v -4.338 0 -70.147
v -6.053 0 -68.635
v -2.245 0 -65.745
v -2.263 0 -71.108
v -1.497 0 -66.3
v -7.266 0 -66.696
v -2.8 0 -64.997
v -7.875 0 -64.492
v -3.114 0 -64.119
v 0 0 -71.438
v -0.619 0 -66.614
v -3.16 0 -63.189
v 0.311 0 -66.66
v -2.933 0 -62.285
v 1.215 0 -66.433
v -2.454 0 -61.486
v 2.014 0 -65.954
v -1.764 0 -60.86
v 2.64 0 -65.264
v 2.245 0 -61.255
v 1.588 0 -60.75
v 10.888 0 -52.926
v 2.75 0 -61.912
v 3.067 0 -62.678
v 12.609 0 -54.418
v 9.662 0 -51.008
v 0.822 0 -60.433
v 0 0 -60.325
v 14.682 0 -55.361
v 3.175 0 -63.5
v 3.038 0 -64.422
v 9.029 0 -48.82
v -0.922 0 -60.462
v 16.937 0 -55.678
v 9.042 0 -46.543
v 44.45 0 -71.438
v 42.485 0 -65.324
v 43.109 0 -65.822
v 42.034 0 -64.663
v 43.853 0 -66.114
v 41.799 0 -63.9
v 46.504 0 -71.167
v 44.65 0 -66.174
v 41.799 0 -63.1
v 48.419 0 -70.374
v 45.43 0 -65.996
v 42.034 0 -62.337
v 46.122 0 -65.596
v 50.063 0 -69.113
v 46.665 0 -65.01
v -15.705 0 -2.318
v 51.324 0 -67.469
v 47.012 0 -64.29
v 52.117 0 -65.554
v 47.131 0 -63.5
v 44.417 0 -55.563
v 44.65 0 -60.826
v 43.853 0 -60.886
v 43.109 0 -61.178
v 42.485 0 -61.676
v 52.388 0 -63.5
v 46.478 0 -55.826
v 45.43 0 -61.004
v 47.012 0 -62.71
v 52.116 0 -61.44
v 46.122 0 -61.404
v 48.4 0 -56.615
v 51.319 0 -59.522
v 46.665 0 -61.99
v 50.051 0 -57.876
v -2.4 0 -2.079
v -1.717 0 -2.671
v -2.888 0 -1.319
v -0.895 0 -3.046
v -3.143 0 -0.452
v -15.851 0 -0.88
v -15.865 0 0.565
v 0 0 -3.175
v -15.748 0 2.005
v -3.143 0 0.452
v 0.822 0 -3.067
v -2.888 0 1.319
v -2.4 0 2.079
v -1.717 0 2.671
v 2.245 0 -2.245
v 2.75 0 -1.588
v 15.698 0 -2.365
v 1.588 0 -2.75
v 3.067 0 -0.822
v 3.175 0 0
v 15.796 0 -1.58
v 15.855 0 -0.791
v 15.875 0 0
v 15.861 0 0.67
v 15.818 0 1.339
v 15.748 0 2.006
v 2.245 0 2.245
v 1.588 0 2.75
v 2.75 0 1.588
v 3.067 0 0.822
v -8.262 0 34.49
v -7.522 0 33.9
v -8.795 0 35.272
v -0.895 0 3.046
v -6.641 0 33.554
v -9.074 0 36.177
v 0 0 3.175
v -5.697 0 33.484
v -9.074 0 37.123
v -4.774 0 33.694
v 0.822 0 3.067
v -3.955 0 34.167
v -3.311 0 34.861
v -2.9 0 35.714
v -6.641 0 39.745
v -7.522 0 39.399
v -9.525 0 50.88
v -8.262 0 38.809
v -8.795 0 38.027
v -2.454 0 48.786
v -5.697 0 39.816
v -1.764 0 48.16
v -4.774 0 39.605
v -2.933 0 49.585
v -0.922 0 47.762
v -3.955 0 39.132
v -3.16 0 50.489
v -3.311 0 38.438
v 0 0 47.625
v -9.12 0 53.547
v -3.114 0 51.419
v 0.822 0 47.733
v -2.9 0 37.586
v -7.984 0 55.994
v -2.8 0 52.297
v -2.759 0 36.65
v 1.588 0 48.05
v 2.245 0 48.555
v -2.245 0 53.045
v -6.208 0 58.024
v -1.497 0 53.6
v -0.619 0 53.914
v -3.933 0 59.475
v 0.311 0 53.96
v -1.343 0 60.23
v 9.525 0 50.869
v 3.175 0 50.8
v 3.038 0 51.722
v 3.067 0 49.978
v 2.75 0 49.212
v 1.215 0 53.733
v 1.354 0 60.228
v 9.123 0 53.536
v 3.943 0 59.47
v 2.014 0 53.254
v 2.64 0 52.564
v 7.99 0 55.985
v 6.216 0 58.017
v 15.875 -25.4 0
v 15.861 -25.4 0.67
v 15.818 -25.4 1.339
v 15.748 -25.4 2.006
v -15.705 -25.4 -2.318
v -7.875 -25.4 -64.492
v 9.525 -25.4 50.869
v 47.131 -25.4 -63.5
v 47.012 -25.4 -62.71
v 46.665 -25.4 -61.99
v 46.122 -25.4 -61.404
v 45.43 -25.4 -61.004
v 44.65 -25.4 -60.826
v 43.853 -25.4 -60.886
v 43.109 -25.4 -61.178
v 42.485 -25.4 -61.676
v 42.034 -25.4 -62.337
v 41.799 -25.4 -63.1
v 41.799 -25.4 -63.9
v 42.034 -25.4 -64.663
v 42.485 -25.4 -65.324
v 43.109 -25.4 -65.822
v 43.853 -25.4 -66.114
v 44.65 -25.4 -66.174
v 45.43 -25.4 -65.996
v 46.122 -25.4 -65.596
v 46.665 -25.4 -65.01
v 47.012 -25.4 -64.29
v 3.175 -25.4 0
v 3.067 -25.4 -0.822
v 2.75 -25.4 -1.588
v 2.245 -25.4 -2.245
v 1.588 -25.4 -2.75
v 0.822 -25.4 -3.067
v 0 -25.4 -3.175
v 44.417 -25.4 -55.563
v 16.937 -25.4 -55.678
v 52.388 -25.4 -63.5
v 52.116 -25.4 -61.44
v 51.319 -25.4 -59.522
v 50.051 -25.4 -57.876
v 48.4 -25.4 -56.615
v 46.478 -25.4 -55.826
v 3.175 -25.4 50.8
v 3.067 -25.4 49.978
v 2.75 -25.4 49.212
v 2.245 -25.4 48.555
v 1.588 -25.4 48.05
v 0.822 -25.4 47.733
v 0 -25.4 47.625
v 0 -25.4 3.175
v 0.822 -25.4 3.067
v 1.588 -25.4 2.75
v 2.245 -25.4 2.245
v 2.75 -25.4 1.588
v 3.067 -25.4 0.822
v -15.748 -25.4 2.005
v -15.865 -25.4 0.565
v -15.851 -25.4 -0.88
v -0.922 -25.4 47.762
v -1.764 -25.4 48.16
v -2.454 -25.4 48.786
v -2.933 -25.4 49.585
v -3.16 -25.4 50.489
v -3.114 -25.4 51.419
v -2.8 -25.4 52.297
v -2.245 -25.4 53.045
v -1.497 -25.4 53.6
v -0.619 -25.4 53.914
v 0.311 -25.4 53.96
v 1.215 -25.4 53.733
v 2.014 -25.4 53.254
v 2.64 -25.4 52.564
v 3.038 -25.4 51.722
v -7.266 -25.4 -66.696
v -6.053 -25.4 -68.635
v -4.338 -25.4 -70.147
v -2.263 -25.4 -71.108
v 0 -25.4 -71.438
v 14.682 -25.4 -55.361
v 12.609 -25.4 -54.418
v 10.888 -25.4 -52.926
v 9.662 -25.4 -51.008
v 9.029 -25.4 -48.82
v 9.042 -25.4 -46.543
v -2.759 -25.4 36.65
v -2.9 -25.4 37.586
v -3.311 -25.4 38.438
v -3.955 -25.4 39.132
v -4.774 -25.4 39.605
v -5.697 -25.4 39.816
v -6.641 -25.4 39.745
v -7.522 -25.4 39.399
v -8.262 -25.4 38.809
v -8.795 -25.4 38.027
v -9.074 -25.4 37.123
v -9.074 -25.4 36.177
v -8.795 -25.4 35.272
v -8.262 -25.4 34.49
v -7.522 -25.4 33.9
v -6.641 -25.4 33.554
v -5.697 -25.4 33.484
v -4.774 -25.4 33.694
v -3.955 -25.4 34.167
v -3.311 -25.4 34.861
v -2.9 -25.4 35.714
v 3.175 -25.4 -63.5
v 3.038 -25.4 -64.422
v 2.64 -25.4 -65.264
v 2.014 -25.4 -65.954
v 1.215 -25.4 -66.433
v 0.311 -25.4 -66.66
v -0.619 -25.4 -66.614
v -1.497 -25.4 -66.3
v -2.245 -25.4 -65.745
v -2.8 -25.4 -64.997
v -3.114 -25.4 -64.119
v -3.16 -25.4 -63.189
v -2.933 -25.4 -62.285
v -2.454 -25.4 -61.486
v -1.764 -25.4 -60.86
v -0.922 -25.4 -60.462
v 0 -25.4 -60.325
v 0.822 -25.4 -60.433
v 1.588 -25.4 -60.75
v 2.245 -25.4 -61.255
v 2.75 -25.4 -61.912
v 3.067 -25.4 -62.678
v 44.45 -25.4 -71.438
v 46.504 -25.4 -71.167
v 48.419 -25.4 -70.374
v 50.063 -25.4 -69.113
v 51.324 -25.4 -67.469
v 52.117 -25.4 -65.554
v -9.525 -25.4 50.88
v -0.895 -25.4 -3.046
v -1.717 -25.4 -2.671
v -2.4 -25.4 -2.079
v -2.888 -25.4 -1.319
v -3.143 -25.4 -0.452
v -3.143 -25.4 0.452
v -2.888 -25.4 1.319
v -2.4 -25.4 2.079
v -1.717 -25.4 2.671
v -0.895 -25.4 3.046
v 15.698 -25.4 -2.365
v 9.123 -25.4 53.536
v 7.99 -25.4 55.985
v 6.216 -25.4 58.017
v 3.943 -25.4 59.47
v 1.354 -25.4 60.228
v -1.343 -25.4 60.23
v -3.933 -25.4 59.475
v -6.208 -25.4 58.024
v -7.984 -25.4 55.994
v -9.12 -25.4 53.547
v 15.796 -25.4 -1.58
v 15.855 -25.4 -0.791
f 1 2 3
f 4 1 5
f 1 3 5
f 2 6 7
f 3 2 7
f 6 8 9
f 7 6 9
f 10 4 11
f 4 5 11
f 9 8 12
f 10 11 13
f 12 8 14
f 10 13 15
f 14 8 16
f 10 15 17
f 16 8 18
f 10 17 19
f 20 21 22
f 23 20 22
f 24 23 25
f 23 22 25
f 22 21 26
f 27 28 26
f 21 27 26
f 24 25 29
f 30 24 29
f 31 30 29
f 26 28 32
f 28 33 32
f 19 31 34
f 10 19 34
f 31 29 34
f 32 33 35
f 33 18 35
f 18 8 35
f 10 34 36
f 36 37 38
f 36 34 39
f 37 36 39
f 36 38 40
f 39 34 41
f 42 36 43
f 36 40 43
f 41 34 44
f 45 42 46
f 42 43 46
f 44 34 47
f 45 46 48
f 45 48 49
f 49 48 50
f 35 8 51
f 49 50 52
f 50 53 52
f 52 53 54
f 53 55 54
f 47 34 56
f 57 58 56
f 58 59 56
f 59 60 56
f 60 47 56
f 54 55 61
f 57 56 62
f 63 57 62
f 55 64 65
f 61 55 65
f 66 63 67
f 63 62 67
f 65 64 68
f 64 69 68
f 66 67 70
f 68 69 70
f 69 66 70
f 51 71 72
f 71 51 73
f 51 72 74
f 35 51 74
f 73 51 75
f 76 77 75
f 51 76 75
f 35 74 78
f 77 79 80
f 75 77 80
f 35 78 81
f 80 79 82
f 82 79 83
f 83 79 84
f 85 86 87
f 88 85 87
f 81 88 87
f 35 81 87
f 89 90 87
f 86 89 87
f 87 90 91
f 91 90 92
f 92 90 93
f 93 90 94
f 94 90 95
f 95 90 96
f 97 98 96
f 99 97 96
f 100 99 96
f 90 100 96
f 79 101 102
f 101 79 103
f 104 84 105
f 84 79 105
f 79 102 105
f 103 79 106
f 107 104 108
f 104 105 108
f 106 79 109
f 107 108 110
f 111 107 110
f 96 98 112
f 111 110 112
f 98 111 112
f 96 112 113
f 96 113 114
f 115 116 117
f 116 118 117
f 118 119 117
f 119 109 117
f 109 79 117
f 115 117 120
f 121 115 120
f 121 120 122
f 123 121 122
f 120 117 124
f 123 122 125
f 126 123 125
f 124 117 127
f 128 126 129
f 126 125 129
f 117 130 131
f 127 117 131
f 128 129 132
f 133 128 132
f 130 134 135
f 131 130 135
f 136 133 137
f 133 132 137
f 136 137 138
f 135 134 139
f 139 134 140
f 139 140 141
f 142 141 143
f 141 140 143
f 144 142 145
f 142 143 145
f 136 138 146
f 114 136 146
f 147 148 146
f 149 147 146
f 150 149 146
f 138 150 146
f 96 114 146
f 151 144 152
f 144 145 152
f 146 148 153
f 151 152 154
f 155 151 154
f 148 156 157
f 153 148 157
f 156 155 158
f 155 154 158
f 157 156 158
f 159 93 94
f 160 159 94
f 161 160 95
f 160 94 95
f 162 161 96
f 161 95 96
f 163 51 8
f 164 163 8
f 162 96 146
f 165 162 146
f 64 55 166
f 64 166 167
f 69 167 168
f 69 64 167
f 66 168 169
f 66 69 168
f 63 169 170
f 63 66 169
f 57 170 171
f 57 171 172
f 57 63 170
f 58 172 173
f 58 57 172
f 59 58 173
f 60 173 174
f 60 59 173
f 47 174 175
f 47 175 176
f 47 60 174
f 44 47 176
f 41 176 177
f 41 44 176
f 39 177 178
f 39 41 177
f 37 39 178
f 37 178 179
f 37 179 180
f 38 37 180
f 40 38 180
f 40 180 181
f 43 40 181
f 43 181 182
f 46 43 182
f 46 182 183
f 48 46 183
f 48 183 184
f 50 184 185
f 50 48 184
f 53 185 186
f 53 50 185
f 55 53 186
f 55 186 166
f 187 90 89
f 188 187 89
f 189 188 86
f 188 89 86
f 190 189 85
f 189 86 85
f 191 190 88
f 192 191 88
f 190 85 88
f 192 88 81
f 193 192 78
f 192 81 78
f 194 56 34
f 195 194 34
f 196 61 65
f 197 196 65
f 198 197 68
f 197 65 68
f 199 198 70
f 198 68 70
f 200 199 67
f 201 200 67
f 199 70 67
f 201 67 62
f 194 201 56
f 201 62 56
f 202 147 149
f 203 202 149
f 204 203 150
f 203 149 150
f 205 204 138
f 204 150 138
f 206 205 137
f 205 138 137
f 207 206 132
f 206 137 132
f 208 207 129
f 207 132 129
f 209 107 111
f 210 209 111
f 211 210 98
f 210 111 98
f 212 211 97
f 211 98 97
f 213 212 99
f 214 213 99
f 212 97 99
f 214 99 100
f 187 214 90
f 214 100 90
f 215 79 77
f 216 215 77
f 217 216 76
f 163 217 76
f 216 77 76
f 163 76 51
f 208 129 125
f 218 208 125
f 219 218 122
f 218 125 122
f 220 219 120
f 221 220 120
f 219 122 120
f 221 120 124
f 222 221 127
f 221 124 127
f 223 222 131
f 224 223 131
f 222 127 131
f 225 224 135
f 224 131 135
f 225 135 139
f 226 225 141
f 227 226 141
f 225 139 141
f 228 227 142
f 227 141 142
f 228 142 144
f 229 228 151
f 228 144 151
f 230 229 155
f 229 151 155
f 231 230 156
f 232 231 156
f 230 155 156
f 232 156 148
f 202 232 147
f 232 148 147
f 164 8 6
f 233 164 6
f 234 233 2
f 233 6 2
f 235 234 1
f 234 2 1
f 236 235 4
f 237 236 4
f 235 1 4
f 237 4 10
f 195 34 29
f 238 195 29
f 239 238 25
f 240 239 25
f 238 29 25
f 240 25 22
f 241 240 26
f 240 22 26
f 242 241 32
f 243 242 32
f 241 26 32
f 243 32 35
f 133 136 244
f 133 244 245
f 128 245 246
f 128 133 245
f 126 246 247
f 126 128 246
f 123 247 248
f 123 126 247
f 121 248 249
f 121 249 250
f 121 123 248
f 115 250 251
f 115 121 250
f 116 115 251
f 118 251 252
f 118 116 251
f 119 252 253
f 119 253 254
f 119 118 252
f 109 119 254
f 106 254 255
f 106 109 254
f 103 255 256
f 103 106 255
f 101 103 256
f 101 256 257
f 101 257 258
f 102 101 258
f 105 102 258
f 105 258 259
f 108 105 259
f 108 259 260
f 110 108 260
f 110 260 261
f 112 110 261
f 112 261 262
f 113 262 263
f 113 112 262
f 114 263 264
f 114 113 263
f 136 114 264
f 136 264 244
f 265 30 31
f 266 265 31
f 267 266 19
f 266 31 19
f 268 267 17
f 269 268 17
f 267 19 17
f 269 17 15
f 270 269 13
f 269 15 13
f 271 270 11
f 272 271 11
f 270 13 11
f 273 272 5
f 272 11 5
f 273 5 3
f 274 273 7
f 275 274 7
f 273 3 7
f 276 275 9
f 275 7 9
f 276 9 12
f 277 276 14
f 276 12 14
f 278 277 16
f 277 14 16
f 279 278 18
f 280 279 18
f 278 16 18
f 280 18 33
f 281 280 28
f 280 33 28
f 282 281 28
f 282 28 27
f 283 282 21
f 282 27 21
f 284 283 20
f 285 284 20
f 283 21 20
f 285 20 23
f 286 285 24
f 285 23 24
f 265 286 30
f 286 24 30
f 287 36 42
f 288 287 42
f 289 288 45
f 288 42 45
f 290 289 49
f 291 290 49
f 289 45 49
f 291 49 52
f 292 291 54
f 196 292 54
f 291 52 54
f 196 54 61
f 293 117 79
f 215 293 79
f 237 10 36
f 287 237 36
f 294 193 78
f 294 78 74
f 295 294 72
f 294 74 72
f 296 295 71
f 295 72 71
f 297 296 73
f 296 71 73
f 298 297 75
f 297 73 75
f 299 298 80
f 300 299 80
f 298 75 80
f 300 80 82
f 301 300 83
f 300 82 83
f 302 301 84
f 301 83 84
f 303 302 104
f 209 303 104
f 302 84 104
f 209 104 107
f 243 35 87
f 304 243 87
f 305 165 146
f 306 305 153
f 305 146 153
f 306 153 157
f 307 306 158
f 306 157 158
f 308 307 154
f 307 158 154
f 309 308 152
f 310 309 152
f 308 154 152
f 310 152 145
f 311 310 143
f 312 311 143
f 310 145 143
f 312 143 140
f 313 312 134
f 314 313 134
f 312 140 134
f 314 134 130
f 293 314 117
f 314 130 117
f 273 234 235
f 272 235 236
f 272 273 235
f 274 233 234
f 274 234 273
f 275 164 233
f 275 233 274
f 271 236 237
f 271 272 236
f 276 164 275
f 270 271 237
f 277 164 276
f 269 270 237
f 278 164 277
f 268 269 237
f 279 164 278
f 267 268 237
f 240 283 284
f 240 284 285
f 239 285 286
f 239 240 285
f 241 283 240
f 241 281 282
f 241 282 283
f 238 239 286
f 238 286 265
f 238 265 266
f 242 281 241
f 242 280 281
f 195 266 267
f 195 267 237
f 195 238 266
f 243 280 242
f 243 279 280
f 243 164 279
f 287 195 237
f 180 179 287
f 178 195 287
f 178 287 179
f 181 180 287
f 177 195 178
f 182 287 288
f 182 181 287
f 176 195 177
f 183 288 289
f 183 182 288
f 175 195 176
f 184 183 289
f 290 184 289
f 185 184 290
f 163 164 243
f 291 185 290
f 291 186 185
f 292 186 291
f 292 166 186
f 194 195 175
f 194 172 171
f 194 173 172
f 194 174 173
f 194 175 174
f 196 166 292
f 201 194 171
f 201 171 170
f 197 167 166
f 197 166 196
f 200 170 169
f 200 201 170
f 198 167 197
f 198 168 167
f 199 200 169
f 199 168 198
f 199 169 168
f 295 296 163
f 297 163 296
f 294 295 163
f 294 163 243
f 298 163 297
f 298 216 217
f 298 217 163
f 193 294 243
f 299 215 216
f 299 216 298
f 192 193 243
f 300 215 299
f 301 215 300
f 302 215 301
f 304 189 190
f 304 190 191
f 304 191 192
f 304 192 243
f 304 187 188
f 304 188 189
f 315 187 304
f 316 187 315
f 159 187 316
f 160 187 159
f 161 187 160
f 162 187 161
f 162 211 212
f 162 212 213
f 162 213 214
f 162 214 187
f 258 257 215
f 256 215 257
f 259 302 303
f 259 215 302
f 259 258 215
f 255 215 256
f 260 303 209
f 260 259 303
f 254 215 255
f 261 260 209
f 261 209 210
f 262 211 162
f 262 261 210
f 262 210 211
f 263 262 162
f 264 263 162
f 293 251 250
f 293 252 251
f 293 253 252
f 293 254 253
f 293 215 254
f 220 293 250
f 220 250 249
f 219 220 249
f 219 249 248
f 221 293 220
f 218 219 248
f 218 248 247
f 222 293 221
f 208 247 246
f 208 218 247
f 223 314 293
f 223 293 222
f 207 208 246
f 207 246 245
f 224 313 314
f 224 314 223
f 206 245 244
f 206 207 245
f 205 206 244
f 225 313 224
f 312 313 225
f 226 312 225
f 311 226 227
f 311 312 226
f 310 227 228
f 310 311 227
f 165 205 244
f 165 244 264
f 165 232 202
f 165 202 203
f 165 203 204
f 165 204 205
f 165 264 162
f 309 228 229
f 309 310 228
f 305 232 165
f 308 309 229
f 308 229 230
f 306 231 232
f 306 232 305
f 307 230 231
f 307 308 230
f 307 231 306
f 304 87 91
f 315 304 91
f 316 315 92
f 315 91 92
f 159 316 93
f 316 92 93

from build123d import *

# Parameters (mm, degrees)
F0_R     = 3.175
F0_R_2   = 2.6811430303
F1_DEPTH = 25.4
F2_DEPTH = 25.4
F3_DEPTH = 25.4


with BuildPart() as f1:
    # F0 (on Front) → F1 (new body)
    with BuildSketch(Plane.XZ):
        with BuildLine():
            ThreePointArc((-9.5246666481, 50.8796884045), (-6.7633075138, 44.0930411904), (0, 41.275))
            ThreePointArc((0, 41.275), (6.7351920908, 44.0648079092), (9.525, 50.8))
            ThreePointArc((9.525, 50.8), (9.5249382463, 50.8342987513), (9.524752986, 50.8685970579))
            ThreePointArc((9.524752986, 50.8685970579), (0.0055458414, 60.3249983855), (-9.5246666481, 50.8796884045))
        make_face()
        with BuildLine():
            ThreePointArc((3.175, 50.8), (2.2450640303, 48.5549359697), (0, 47.625))
            ThreePointArc((0, 47.625), (-2.2450640303, 53.0450640303), (3.175, 50.8))
        make_face(mode=Mode.SUBTRACT)
        with BuildLine():
            ThreePointArc((9.525, 50.8), (6.7351920908, 44.0648079092), (0, 41.275))
            Line((0, 41.275), (0, 36.5252))
            Line((0, 36.5252), (0, 15.875))
            ThreePointArc((0, 15.875), (10.4923027044, 11.9133206521), (15.7478005035, 2.0055932546))
            Line((15.7478005035, 2.0055932546), (9.524752986, 50.8685970579))
            ThreePointArc((9.524752986, 50.8685970579), (9.5249382463, 50.8342987513), (9.525, 50.8))
        make_face()
        with BuildLine():
            Line((0, 36.5252), (0, 41.275))
            ThreePointArc((0, 41.275), (-6.7633075138, 44.0930411904), (-9.5246666481, 50.8796884045))
            Line((-9.5246666481, 50.8796884045), (-15.747854052, 2.0051727503))
            ThreePointArc((-15.747854052, 2.0051727503), (-10.4924617605, 11.9131805663), (0, 15.875))
            Line((0, 15.875), (0, 36.5252))
        make_face()
        with Locations((-5.9342440218, 36.6497449577)):
            Circle(F0_R, mode=Mode.SUBTRACT)
        with BuildLine():
            ThreePointArc((15.7478005035, 2.0055932546), (10.4923027044, 11.9133206521), (0, 15.875))
            Line((0, 15.875), (0, 3.175))
            ThreePointArc((0, 3.175), (2.2450640303, 2.2450640303), (3.175, 0))
            ThreePointArc((3.175, 0), (2.2450640303, -2.2450640303), (0, -3.175))
            Line((0, -3.175), (0, -15.875))
            ThreePointArc((0, -15.875), (10.3554540779, -12.0324642464), (15.697843269, -2.3650246727))
            ThreePointArc((15.697843269, -2.3650246727), (15.8306488638, -1.1858252622), (15.875, 0))
            ThreePointArc((15.875, 0), (15.8431682121, 1.004811427), (15.7478005035, 2.0055932546))
        make_face()
        with BuildLine():
            Line((0, 3.175), (0, 15.875))
            ThreePointArc((0, 15.875), (-10.4924617605, 11.9131805663), (-15.747854052, 2.0051727503))
            ThreePointArc((-15.747854052, 2.0051727503), (-15.8742138864, -0.1579825563), (-15.7048272525, -2.3181945497))
            ThreePointArc((-15.7048272525, -2.3181945497), (-10.3733862968, -12.0170080194), (0, -15.875))
            Line((0, -15.875), (0, -3.175))
            ThreePointArc((0, -3.175), (-3.175, 0), (0, 3.175))
        make_face()
        with BuildLine():
            ThreePointArc((0, -15.875), (-10.3733862968, -12.0170080194), (-15.7048272525, -2.3181945497))
            Line((-15.7048272525, -2.3181945497), (-7.8753007349, -64.4917381631))
            ThreePointArc((-7.8753007349, -64.4917381631), (-5.9529752192, -58.2496674115), (0, -55.5625))
            Line((0, -55.5625), (0, -15.875))
        make_face()
        with BuildLine():
            ThreePointArc((15.697843269, -2.3650246727), (10.3554540779, -12.0324642464), (0, -15.875))
            Line((0, -15.875), (0, -55.5625))
            ThreePointArc((0, -55.5625), (5.6126600757, -57.8873399243), (7.9375, -63.5))
            ThreePointArc((7.9375, -63.5), (5.6126600757, -69.1126600757), (0, -71.4375))
            Line((0, -71.4375), (44.45, -71.4375))
            ThreePointArc((44.45, -71.4375), (36.5125174611, -63.5166491853), (44.4167017026, -55.5625698445))
            Line((44.4167017026, -55.5625698445), (16.9368082183, -55.6778506909))
            ThreePointArc((16.9368082183, -55.6778506909), (10.8884896462, -52.9263600902), (9.0419767345, -46.543316291))
            Line((9.0419767345, -46.543316291), (15.697843269, -2.3650246727))
        make_face()
        with BuildLine():
            ThreePointArc((0, -55.5625), (-5.9529752192, -58.2496674115), (-7.8753007349, -64.4917381631))
            ThreePointArc((-7.8753007349, -64.4917381631), (-5.2503325885, -69.4529752192), (0, -71.4375))
            ThreePointArc((0, -71.4375), (5.6126600757, -69.1126600757), (7.9375, -63.5))
            ThreePointArc((7.9375, -63.5), (5.6126600757, -57.8873399243), (0, -55.5625))
        make_face()
        with BuildLine():
            ThreePointArc((3.175, -63.5), (-2.2450640303, -65.7450640303), (0, -60.325))
            ThreePointArc((0, -60.325), (2.2450640303, -61.2549359697), (3.175, -63.5))
        make_face(mode=Mode.SUBTRACT)
        with BuildLine():
            ThreePointArc((44.4167017026, -55.5625698445), (36.5125174611, -63.5166491853), (44.45, -71.4375))
            ThreePointArc((44.45, -71.4375), (50.0626600757, -69.1126600757), (52.3875, -63.5))
            ThreePointArc((52.3875, -63.5), (50.0508749769, -57.8755795194), (44.4167017026, -55.5625698445))
        make_face()
        with Locations((44.45, -63.5)):
            Circle(F0_R_2, mode=Mode.SUBTRACT)
    extrude(amount=F1_DEPTH)

    # F0 (on Front) → F2 (join)
    with BuildSketch(Plane.XZ):
        with BuildLine():
            ThreePointArc((-9.5246666481, 50.8796884045), (-6.7633075138, 44.0930411904), (0, 41.275))
            ThreePointArc((0, 41.275), (6.7351920908, 44.0648079092), (9.525, 50.8))
            ThreePointArc((9.525, 50.8), (9.5249382463, 50.8342987513), (9.524752986, 50.8685970579))
            ThreePointArc((9.524752986, 50.8685970579), (0.0055458414, 60.3249983855), (-9.5246666481, 50.8796884045))
        make_face()
        with BuildLine():
            ThreePointArc((3.175, 50.8), (2.2450640303, 48.5549359697), (0, 47.625))
            ThreePointArc((0, 47.625), (-2.2450640303, 53.0450640303), (3.175, 50.8))
        make_face(mode=Mode.SUBTRACT)
        with BuildLine():
            ThreePointArc((9.525, 50.8), (6.7351920908, 44.0648079092), (0, 41.275))
            Line((0, 41.275), (0, 36.5252))
            Line((0, 36.5252), (0, 15.875))
            ThreePointArc((0, 15.875), (10.4923027044, 11.9133206521), (15.7478005035, 2.0055932546))
            Line((15.7478005035, 2.0055932546), (9.524752986, 50.8685970579))
            ThreePointArc((9.524752986, 50.8685970579), (9.5249382463, 50.8342987513), (9.525, 50.8))
        make_face()
        with BuildLine():
            Line((0, 36.5252), (0, 41.275))
            ThreePointArc((0, 41.275), (-6.7633075138, 44.0930411904), (-9.5246666481, 50.8796884045))
            Line((-9.5246666481, 50.8796884045), (-15.747854052, 2.0051727503))
            ThreePointArc((-15.747854052, 2.0051727503), (-10.4924617605, 11.9131805663), (0, 15.875))
            Line((0, 15.875), (0, 36.5252))
        make_face()
        with Locations((-5.9342440218, 36.6497449577)):
            Circle(F0_R, mode=Mode.SUBTRACT)
        with BuildLine():
            ThreePointArc((15.7478005035, 2.0055932546), (10.4923027044, 11.9133206521), (0, 15.875))
            Line((0, 15.875), (0, 3.175))
            ThreePointArc((0, 3.175), (2.2450640303, 2.2450640303), (3.175, 0))
            ThreePointArc((3.175, 0), (2.2450640303, -2.2450640303), (0, -3.175))
            Line((0, -3.175), (0, -15.875))
            ThreePointArc((0, -15.875), (10.3554540779, -12.0324642464), (15.697843269, -2.3650246727))
            ThreePointArc((15.697843269, -2.3650246727), (15.8306488638, -1.1858252622), (15.875, 0))
            ThreePointArc((15.875, 0), (15.8431682121, 1.004811427), (15.7478005035, 2.0055932546))
        make_face()
        with BuildLine():
            Line((0, 3.175), (0, 15.875))
            ThreePointArc((0, 15.875), (-10.4924617605, 11.9131805663), (-15.747854052, 2.0051727503))
            ThreePointArc((-15.747854052, 2.0051727503), (-15.8742138864, -0.1579825563), (-15.7048272525, -2.3181945497))
            ThreePointArc((-15.7048272525, -2.3181945497), (-10.3733862968, -12.0170080194), (0, -15.875))
            Line((0, -15.875), (0, -3.175))
            ThreePointArc((0, -3.175), (-3.175, 0), (0, 3.175))
        make_face()
        with BuildLine():
            ThreePointArc((0, -15.875), (-10.3733862968, -12.0170080194), (-15.7048272525, -2.3181945497))
            Line((-15.7048272525, -2.3181945497), (-7.8753007349, -64.4917381631))
            ThreePointArc((-7.8753007349, -64.4917381631), (-5.9529752192, -58.2496674115), (0, -55.5625))
            Line((0, -55.5625), (0, -15.875))
        make_face()
        with BuildLine():
            ThreePointArc((15.697843269, -2.3650246727), (10.3554540779, -12.0324642464), (0, -15.875))
            Line((0, -15.875), (0, -55.5625))
            ThreePointArc((0, -55.5625), (5.6126600757, -57.8873399243), (7.9375, -63.5))
            ThreePointArc((7.9375, -63.5), (5.6126600757, -69.1126600757), (0, -71.4375))
            Line((0, -71.4375), (44.45, -71.4375))
            ThreePointArc((44.45, -71.4375), (36.5125174611, -63.5166491853), (44.4167017026, -55.5625698445))
            Line((44.4167017026, -55.5625698445), (16.9368082183, -55.6778506909))
            ThreePointArc((16.9368082183, -55.6778506909), (10.8884896462, -52.9263600902), (9.0419767345, -46.543316291))
            Line((9.0419767345, -46.543316291), (15.697843269, -2.3650246727))
        make_face()
        with BuildLine():
            ThreePointArc((0, -55.5625), (-5.9529752192, -58.2496674115), (-7.8753007349, -64.4917381631))
            ThreePointArc((-7.8753007349, -64.4917381631), (-5.2503325885, -69.4529752192), (0, -71.4375))
            ThreePointArc((0, -71.4375), (5.6126600757, -69.1126600757), (7.9375, -63.5))
            ThreePointArc((7.9375, -63.5), (5.6126600757, -57.8873399243), (0, -55.5625))
        make_face()
        with BuildLine():
            ThreePointArc((3.175, -63.5), (-2.2450640303, -65.7450640303), (0, -60.325))
            ThreePointArc((0, -60.325), (2.2450640303, -61.2549359697), (3.175, -63.5))
        make_face(mode=Mode.SUBTRACT)
        with BuildLine():
            ThreePointArc((44.4167017026, -55.5625698445), (36.5125174611, -63.5166491853), (44.45, -71.4375))
            ThreePointArc((44.45, -71.4375), (50.0626600757, -69.1126600757), (52.3875, -63.5))
            ThreePointArc((52.3875, -63.5), (50.0508749769, -57.8755795194), (44.4167017026, -55.5625698445))
        make_face()
        with Locations((44.45, -63.5)):
            Circle(F0_R_2, mode=Mode.SUBTRACT)
    extrude(amount=F2_DEPTH)

    # F0 (on Front) → F3 (join)
    with BuildSketch(Plane.XZ):
        with BuildLine():
            ThreePointArc((-9.5246666481, 50.8796884045), (-6.7633075138, 44.0930411904), (0, 41.275))
            ThreePointArc((0, 41.275), (6.7351920908, 44.0648079092), (9.525, 50.8))
            ThreePointArc((9.525, 50.8), (9.5249382463, 50.8342987513), (9.524752986, 50.8685970579))
            ThreePointArc((9.524752986, 50.8685970579), (0.0055458414, 60.3249983855), (-9.5246666481, 50.8796884045))
        make_face()
        with BuildLine():
            ThreePointArc((3.175, 50.8), (2.2450640303, 48.5549359697), (0, 47.625))
            ThreePointArc((0, 47.625), (-2.2450640303, 53.0450640303), (3.175, 50.8))
        make_face(mode=Mode.SUBTRACT)
        with BuildLine():
            ThreePointArc((9.525, 50.8), (6.7351920908, 44.0648079092), (0, 41.275))
            Line((0, 41.275), (0, 36.5252))
            Line((0, 36.5252), (0, 15.875))
            ThreePointArc((0, 15.875), (10.4923027044, 11.9133206521), (15.7478005035, 2.0055932546))
            Line((15.7478005035, 2.0055932546), (9.524752986, 50.8685970579))
            ThreePointArc((9.524752986, 50.8685970579), (9.5249382463, 50.8342987513), (9.525, 50.8))
        make_face()
        with BuildLine():
            Line((0, 36.5252), (0, 41.275))
            ThreePointArc((0, 41.275), (-6.7633075138, 44.0930411904), (-9.5246666481, 50.8796884045))
            Line((-9.5246666481, 50.8796884045), (-15.747854052, 2.0051727503))
            ThreePointArc((-15.747854052, 2.0051727503), (-10.4924617605, 11.9131805663), (0, 15.875))
            Line((0, 15.875), (0, 36.5252))
        make_face()
        with Locations((-5.9342440218, 36.6497449577)):
            Circle(F0_R, mode=Mode.SUBTRACT)
        with BuildLine():
            ThreePointArc((15.7478005035, 2.0055932546), (10.4923027044, 11.9133206521), (0, 15.875))
            Line((0, 15.875), (0, 3.175))
            ThreePointArc((0, 3.175), (2.2450640303, 2.2450640303), (3.175, 0))
            ThreePointArc((3.175, 0), (2.2450640303, -2.2450640303), (0, -3.175))
            Line((0, -3.175), (0, -15.875))
            ThreePointArc((0, -15.875), (10.3554540779, -12.0324642464), (15.697843269, -2.3650246727))
            ThreePointArc((15.697843269, -2.3650246727), (15.8306488638, -1.1858252622), (15.875, 0))
            ThreePointArc((15.875, 0), (15.8431682121, 1.004811427), (15.7478005035, 2.0055932546))
        make_face()
        with BuildLine():
            Line((0, 3.175), (0, 15.875))
            ThreePointArc((0, 15.875), (-10.4924617605, 11.9131805663), (-15.747854052, 2.0051727503))
            ThreePointArc((-15.747854052, 2.0051727503), (-15.8742138864, -0.1579825563), (-15.7048272525, -2.3181945497))
            ThreePointArc((-15.7048272525, -2.3181945497), (-10.3733862968, -12.0170080194), (0, -15.875))
            Line((0, -15.875), (0, -3.175))
            ThreePointArc((0, -3.175), (-3.175, 0), (0, 3.175))
        make_face()
        with BuildLine():
            ThreePointArc((0, -15.875), (-10.3733862968, -12.0170080194), (-15.7048272525, -2.3181945497))
            Line((-15.7048272525, -2.3181945497), (-7.8753007349, -64.4917381631))
            ThreePointArc((-7.8753007349, -64.4917381631), (-5.9529752192, -58.2496674115), (0, -55.5625))
            Line((0, -55.5625), (0, -15.875))
        make_face()
        with BuildLine():
            ThreePointArc((15.697843269, -2.3650246727), (10.3554540779, -12.0324642464), (0, -15.875))
            Line((0, -15.875), (0, -55.5625))
            ThreePointArc((0, -55.5625), (5.6126600757, -57.8873399243), (7.9375, -63.5))
            ThreePointArc((7.9375, -63.5), (5.6126600757, -69.1126600757), (0, -71.4375))
            Line((0, -71.4375), (44.45, -71.4375))
            ThreePointArc((44.45, -71.4375), (36.5125174611, -63.5166491853), (44.4167017026, -55.5625698445))
            Line((44.4167017026, -55.5625698445), (16.9368082183, -55.6778506909))
            ThreePointArc((16.9368082183, -55.6778506909), (10.8884896462, -52.9263600902), (9.0419767345, -46.543316291))
            Line((9.0419767345, -46.543316291), (15.697843269, -2.3650246727))
        make_face()
        with BuildLine():
            ThreePointArc((0, -55.5625), (-5.9529752192, -58.2496674115), (-7.8753007349, -64.4917381631))
            ThreePointArc((-7.8753007349, -64.4917381631), (-5.2503325885, -69.4529752192), (0, -71.4375))
            ThreePointArc((0, -71.4375), (5.6126600757, -69.1126600757), (7.9375, -63.5))
            ThreePointArc((7.9375, -63.5), (5.6126600757, -57.8873399243), (0, -55.5625))
        make_face()
        with BuildLine():
            ThreePointArc((3.175, -63.5), (-2.2450640303, -65.7450640303), (0, -60.325))
            ThreePointArc((0, -60.325), (2.2450640303, -61.2549359697), (3.175, -63.5))
        make_face(mode=Mode.SUBTRACT)
        with BuildLine():
            ThreePointArc((44.4167017026, -55.5625698445), (36.5125174611, -63.5166491853), (44.45, -71.4375))
            ThreePointArc((44.45, -71.4375), (50.0626600757, -69.1126600757), (52.3875, -63.5))
            ThreePointArc((52.3875, -63.5), (50.0508749769, -57.8755795194), (44.4167017026, -55.5625698445))
        make_face()
        with Locations((44.45, -63.5)):
            Circle(F0_R_2, mode=Mode.SUBTRACT)
    extrude(amount=F3_DEPTH)


solid = f1.part
